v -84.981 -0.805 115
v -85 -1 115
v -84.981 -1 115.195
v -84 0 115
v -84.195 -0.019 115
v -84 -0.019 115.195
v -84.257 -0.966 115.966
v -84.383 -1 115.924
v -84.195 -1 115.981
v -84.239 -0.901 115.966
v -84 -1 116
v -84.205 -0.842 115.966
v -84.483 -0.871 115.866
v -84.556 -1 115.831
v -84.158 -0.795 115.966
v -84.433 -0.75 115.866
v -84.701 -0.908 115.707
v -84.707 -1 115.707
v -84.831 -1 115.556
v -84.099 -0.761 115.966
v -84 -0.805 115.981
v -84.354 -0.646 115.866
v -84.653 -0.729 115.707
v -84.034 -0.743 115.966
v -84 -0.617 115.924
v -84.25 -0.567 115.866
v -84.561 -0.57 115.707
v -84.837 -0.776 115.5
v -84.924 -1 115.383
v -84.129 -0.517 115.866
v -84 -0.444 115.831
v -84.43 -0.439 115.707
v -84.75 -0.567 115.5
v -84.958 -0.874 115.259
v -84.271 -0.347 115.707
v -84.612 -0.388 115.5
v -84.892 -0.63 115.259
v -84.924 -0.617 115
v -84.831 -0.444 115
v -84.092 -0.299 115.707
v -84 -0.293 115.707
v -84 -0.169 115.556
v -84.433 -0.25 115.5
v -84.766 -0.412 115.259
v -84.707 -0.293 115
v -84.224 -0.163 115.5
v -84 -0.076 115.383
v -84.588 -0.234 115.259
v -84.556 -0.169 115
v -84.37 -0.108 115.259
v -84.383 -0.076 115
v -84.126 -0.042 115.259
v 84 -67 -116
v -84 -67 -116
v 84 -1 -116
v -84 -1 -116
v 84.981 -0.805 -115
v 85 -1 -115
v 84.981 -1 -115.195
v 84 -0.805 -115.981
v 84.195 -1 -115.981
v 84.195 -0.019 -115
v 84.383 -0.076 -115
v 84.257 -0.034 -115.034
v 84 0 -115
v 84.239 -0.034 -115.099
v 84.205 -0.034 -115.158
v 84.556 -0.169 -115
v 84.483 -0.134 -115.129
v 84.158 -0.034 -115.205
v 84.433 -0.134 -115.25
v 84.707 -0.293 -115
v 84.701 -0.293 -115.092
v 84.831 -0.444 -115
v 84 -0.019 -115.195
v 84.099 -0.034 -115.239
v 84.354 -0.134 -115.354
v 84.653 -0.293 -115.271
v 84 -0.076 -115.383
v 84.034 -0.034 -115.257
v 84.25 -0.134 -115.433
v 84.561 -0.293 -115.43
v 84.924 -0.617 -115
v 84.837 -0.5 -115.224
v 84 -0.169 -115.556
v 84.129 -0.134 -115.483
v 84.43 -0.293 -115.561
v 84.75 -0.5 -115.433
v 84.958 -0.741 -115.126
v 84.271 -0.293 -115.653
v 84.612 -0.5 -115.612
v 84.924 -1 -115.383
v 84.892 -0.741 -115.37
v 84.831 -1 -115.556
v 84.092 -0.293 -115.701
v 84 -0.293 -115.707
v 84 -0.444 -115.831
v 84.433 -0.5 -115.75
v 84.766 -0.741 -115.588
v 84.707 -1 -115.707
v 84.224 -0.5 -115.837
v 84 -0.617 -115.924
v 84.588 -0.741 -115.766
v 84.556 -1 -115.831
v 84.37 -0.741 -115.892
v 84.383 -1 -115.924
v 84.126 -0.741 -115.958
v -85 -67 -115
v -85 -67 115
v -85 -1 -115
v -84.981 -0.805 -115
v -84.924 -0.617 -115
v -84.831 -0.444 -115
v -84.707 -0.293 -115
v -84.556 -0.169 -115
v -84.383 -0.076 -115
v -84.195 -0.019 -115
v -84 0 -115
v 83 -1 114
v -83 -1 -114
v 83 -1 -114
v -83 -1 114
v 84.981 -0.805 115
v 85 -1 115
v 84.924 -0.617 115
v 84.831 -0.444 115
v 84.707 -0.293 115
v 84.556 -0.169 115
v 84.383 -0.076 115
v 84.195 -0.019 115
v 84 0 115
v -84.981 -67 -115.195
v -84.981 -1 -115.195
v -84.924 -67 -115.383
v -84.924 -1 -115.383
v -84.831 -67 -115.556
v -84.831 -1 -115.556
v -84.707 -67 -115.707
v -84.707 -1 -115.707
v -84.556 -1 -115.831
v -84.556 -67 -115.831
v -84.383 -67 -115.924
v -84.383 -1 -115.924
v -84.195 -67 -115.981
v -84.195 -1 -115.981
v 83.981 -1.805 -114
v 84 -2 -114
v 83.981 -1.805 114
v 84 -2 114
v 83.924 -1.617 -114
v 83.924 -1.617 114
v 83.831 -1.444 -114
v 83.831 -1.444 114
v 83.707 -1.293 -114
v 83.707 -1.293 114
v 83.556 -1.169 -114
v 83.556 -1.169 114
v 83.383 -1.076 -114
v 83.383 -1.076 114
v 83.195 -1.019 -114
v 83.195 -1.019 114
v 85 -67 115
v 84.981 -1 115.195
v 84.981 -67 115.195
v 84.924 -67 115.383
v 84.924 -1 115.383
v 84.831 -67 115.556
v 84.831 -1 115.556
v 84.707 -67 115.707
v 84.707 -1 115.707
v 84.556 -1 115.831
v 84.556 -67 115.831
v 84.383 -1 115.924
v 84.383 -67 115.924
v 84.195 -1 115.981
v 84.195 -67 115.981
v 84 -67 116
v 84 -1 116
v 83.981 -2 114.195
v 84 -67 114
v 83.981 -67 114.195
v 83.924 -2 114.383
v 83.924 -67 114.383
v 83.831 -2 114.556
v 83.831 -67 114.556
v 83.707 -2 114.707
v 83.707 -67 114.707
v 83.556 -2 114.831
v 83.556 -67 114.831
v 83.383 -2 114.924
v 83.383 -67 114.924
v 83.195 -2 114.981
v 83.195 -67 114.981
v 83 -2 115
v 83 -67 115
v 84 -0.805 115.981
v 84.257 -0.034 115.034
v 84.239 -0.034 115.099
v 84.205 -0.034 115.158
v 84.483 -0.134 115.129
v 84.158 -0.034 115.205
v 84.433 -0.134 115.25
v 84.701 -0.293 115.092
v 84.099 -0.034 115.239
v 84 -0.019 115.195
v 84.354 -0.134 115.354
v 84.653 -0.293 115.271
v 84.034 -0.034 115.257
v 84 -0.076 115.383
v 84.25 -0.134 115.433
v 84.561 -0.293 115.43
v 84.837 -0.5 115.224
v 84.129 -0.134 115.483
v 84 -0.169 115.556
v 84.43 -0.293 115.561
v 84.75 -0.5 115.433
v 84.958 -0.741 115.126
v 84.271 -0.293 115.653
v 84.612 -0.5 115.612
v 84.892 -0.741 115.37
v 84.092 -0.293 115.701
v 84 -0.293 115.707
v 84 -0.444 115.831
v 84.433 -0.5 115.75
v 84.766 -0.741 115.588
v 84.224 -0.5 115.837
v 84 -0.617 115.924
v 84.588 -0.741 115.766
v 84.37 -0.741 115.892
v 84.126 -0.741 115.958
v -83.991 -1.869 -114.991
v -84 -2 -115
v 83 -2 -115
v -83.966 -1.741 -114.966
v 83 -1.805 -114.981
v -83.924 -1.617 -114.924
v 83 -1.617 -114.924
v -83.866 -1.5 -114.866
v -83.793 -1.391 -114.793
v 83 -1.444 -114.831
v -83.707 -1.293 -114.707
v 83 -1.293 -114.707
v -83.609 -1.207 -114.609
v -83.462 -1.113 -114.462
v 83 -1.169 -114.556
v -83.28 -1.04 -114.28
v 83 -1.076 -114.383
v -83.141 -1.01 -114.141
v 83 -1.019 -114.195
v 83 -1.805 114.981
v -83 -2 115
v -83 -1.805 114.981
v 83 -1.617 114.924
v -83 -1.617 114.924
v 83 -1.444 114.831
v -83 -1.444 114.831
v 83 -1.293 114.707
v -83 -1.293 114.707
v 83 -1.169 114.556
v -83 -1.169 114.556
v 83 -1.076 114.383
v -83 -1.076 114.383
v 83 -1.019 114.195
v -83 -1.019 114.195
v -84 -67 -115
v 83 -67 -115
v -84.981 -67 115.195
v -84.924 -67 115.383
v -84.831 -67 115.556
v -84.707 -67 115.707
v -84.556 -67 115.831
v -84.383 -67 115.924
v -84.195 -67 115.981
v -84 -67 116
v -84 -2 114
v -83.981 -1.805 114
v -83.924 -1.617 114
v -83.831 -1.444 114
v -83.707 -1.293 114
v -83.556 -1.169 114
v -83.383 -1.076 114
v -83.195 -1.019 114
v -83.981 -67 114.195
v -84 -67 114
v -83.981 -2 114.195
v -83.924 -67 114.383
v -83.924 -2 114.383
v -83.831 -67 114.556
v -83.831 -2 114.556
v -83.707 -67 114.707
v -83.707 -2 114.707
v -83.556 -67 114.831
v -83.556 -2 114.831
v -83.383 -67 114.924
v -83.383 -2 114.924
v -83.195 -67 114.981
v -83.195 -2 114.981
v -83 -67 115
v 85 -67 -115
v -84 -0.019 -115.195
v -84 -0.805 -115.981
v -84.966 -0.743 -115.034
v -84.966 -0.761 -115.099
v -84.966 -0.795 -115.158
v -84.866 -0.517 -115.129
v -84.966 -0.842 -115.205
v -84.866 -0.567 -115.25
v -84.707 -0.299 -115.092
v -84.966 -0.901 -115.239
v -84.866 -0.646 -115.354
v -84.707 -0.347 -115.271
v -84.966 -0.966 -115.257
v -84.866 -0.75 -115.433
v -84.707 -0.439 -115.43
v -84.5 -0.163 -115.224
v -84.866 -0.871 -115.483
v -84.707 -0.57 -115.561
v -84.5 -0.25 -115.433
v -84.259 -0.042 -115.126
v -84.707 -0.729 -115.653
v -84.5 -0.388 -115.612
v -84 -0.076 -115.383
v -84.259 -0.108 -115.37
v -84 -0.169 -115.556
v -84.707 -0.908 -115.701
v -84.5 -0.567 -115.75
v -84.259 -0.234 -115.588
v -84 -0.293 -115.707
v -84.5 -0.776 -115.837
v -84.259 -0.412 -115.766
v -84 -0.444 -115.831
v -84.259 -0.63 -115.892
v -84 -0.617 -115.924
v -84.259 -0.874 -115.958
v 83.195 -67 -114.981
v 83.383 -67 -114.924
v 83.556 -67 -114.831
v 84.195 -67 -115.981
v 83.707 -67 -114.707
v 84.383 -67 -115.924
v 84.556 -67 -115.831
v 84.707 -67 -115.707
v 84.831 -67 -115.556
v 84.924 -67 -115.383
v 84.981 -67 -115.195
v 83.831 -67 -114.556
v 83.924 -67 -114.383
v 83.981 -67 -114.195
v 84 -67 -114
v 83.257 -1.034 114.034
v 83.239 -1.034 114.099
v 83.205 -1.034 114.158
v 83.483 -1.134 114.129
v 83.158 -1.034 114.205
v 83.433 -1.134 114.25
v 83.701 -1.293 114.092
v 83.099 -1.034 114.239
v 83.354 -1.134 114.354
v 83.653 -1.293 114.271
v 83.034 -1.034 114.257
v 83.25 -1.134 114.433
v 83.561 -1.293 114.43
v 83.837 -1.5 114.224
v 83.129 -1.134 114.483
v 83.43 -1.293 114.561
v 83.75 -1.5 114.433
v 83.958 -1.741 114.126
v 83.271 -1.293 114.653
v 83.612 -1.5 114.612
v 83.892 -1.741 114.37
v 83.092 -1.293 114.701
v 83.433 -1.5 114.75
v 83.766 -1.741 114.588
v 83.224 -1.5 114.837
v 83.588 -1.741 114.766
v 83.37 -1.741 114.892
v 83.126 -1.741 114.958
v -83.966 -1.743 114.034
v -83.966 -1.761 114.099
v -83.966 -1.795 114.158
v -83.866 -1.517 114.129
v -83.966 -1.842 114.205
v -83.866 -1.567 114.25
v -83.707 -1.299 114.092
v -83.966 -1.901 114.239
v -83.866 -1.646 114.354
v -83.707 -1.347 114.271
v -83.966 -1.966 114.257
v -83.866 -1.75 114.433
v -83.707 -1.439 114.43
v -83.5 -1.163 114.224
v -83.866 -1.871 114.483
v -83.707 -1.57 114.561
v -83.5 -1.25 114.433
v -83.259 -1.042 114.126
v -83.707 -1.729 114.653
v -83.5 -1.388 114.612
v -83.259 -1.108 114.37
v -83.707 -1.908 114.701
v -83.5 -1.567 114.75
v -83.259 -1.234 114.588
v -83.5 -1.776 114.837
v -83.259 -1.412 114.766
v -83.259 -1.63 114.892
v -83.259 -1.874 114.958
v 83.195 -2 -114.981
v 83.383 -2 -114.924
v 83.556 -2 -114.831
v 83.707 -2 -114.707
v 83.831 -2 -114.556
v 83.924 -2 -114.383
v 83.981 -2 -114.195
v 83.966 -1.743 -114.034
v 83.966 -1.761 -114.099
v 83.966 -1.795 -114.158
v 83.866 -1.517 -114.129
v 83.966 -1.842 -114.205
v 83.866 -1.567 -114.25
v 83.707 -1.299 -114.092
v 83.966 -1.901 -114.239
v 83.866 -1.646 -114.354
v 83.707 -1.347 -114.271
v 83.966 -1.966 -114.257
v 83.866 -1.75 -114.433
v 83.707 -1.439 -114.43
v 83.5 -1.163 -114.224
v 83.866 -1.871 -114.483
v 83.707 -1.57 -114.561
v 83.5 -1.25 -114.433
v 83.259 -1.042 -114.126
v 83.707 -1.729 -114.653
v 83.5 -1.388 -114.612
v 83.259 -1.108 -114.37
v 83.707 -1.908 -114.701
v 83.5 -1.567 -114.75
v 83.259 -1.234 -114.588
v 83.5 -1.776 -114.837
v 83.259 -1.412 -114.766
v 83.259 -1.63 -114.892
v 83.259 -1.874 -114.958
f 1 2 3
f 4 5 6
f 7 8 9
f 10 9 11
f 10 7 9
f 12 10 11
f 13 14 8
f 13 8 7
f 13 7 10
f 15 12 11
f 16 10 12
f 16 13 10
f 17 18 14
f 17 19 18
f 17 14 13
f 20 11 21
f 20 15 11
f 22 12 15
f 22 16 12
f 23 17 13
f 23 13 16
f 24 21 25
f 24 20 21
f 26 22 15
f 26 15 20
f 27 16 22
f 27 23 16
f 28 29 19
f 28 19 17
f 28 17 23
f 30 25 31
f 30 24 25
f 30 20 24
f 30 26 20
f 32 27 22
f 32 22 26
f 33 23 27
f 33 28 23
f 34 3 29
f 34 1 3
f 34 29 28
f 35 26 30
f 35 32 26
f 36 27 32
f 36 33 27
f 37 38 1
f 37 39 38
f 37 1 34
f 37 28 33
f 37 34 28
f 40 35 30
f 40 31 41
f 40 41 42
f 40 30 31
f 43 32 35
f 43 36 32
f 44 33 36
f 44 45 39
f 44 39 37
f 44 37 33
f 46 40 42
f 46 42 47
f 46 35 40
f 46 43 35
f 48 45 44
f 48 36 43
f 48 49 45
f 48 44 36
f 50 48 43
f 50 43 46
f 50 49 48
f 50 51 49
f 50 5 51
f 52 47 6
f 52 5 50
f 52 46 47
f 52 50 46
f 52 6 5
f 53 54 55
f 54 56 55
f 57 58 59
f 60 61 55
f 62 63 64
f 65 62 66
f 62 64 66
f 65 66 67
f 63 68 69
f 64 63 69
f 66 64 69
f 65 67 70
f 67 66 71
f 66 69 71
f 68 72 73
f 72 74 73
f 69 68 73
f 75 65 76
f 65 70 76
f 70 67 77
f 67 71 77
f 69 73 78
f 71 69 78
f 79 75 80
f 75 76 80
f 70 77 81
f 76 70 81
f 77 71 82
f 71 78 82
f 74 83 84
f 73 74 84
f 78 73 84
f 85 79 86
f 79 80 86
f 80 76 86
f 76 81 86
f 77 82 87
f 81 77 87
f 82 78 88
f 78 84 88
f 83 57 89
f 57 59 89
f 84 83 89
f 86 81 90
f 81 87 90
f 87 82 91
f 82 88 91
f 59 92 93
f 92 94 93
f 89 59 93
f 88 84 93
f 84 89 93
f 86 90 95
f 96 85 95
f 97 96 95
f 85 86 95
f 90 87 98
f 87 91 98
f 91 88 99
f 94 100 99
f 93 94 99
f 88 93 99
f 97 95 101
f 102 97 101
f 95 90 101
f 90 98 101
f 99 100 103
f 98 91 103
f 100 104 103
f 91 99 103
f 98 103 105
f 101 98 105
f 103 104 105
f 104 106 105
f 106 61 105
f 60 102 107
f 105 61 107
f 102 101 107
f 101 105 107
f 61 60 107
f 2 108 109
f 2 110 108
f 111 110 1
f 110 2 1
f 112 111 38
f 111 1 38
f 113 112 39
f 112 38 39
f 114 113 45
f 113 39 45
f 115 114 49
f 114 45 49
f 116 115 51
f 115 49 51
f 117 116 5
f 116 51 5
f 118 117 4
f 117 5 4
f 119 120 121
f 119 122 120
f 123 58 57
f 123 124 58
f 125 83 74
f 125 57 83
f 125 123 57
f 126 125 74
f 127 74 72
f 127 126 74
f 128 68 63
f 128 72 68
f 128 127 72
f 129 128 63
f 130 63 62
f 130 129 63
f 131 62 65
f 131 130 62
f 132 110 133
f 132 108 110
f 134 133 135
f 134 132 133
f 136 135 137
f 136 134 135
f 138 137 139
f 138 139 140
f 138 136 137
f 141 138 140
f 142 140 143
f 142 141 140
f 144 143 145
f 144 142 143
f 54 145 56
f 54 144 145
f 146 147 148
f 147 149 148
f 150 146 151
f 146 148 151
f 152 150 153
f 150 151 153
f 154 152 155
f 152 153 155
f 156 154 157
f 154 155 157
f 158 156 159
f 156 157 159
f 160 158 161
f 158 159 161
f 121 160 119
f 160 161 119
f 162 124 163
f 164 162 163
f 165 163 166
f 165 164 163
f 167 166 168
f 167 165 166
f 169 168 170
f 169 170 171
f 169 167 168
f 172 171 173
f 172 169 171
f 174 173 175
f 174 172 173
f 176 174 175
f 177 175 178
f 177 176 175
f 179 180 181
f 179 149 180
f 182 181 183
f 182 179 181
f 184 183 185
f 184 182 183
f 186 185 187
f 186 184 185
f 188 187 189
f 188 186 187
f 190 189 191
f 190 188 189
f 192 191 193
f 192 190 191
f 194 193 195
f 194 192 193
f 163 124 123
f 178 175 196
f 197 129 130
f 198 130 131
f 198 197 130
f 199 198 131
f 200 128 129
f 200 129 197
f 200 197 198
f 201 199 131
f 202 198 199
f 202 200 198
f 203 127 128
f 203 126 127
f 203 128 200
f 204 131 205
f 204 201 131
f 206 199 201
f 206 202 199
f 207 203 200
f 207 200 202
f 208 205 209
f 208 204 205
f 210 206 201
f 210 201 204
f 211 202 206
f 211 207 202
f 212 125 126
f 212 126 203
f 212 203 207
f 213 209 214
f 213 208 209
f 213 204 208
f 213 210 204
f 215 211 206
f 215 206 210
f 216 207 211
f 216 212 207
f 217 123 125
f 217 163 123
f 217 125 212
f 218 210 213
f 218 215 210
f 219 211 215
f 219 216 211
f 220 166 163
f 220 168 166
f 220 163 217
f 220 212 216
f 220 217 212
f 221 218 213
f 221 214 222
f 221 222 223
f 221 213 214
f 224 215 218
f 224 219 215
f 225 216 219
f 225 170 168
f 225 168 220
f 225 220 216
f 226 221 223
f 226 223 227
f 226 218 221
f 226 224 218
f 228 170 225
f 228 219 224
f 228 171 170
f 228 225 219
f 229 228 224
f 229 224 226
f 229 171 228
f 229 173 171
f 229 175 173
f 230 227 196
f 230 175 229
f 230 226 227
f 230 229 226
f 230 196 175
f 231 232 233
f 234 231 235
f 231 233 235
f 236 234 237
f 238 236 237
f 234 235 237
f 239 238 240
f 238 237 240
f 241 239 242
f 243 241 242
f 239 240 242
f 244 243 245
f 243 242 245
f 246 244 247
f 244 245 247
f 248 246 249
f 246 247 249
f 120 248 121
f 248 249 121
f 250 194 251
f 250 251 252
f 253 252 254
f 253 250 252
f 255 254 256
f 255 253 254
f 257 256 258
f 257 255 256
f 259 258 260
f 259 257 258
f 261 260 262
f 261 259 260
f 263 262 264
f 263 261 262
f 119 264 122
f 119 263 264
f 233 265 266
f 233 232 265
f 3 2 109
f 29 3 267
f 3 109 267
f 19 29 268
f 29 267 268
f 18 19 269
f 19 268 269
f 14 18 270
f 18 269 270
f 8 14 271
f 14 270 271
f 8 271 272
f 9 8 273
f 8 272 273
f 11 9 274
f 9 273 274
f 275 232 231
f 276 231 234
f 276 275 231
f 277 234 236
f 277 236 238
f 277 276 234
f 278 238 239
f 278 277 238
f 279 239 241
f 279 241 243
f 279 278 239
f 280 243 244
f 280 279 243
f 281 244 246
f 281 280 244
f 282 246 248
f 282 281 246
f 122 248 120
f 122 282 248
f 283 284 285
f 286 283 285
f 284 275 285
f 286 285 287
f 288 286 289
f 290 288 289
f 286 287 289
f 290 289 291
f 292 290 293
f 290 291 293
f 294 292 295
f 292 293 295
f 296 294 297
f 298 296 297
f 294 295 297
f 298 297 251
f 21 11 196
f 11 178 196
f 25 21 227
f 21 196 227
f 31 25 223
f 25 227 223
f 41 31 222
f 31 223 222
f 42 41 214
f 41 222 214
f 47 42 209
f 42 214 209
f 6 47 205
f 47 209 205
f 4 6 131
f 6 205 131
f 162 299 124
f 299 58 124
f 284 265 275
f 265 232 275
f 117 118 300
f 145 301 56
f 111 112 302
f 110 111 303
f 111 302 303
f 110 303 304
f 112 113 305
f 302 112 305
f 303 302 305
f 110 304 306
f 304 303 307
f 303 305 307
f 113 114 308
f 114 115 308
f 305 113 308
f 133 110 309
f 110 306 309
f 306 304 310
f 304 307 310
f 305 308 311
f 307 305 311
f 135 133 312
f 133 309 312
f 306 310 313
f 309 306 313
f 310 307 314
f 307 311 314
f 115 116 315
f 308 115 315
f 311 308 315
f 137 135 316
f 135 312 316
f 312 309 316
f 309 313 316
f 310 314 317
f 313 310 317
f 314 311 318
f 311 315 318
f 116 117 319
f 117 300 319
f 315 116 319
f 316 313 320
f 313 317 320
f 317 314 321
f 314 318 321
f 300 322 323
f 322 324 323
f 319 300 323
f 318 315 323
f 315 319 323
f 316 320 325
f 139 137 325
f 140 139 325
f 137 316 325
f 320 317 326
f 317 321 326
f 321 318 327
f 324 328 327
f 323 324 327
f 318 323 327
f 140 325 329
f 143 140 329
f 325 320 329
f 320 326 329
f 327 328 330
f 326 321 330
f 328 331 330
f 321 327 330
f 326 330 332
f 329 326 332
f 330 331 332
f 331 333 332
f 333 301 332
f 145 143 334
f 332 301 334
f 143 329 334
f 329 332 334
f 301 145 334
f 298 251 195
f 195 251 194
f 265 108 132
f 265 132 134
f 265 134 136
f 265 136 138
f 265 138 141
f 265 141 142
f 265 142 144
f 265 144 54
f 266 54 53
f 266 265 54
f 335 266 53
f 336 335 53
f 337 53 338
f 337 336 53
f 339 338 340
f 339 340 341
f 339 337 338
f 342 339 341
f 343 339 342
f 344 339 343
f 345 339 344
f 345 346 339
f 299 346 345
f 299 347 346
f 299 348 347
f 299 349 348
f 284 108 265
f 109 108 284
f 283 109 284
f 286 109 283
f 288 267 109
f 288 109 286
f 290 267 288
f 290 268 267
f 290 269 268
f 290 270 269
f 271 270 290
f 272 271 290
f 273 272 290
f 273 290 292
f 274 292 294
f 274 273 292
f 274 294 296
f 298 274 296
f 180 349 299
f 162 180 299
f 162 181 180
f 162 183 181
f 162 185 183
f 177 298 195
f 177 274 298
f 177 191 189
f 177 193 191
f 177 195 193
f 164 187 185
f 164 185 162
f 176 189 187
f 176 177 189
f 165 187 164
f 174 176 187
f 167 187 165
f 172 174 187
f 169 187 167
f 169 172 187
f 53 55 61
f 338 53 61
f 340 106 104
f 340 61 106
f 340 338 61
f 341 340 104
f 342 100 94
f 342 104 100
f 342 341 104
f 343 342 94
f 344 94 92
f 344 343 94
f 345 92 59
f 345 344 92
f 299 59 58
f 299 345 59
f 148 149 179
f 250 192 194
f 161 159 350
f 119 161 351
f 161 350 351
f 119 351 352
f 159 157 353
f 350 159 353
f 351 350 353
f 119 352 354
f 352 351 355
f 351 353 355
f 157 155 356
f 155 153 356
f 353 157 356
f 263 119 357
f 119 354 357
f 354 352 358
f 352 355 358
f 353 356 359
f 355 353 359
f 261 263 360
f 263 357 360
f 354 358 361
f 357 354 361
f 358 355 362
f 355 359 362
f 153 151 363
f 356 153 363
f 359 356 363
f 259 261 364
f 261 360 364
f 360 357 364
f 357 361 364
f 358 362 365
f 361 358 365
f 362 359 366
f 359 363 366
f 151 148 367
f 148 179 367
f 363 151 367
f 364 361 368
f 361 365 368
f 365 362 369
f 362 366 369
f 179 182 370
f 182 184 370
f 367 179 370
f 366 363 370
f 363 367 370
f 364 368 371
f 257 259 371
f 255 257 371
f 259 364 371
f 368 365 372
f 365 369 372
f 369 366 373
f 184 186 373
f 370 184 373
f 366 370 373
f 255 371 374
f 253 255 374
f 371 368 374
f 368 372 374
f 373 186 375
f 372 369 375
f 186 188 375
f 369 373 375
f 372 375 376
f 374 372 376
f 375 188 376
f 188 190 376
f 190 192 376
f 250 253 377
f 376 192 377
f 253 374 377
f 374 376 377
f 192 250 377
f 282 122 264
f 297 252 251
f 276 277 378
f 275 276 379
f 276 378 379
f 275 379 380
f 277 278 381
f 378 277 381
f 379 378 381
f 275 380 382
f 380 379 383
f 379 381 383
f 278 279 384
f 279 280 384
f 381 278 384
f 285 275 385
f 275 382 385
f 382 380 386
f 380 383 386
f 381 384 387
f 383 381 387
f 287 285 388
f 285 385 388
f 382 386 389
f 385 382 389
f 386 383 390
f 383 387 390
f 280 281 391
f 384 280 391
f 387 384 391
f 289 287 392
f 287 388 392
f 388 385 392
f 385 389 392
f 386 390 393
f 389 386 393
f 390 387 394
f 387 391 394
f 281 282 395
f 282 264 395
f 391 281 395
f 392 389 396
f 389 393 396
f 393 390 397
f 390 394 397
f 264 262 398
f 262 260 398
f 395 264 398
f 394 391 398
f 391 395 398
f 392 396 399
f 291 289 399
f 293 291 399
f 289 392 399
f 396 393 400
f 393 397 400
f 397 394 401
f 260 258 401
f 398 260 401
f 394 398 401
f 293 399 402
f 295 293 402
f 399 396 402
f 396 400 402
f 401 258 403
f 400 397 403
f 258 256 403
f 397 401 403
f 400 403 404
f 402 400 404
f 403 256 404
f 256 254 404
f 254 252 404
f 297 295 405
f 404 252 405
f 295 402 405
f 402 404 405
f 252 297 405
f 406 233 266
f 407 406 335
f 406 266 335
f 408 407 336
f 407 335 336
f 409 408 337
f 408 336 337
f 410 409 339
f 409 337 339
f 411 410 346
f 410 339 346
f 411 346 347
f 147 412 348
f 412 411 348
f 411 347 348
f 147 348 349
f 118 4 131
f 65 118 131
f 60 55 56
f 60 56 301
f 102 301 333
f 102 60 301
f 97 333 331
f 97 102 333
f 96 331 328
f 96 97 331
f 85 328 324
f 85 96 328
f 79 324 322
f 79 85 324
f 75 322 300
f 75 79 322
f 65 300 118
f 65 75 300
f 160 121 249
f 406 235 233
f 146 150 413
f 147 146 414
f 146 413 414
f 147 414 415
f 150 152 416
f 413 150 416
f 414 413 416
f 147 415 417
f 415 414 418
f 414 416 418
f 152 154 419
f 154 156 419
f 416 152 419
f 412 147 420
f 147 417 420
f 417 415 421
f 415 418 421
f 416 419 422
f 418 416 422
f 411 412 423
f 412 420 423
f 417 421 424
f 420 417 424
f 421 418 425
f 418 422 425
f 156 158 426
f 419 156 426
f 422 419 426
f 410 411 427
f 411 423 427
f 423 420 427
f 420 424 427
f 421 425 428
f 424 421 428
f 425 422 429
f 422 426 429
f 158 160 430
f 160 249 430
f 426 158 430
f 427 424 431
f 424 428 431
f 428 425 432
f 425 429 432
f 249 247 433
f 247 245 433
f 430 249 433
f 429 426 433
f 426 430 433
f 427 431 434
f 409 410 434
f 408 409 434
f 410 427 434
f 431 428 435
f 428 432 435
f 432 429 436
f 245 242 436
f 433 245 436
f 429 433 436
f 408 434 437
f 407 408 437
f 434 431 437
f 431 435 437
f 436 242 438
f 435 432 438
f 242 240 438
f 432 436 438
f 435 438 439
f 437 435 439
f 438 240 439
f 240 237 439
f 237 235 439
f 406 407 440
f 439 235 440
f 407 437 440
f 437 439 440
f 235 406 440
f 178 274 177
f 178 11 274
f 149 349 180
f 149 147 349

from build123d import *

# Parameters (mm, degrees)
F0_W     = 170
F0_H     = 232
F1_DEPTH = 67
F2_T     = -1
F3_R     = 1


with BuildPart() as f1:
    # F0 (on Front) → F1 (new body)
    with BuildSketch(Plane.XZ):
        Rectangle(F0_W, F0_H)
    extrude(amount=F1_DEPTH)

    # F2
    f2_openings = [f1.faces().sort_by_distance(p)[0] for p in [
        (0, -67, 0),
    ]]
    offset(amount=F2_T, openings=f2_openings)

    # F3
    f3_edges = [f1.edges().sort_by_distance(p)[0] for p in [
        (85, -33.5, -116),
        (85, -33.5, 116),
        (85, 0, 0),
        (0, 0, -116),
        (-85, 0, 0),
        (-85, -33.5, -116),
        (-85, -33.5, 116),
        (0, 0, 116),
        (84, -34, 115),
        (0, -1, -115),
        (84, -1, 0),
        (0, -1, 115),
        (-84, -1, 0),
        (84, -34, -115),
        (-84, -34, 115),
    ]]
    fillet(f3_edges, radius=F3_R)


solid = f1.part
